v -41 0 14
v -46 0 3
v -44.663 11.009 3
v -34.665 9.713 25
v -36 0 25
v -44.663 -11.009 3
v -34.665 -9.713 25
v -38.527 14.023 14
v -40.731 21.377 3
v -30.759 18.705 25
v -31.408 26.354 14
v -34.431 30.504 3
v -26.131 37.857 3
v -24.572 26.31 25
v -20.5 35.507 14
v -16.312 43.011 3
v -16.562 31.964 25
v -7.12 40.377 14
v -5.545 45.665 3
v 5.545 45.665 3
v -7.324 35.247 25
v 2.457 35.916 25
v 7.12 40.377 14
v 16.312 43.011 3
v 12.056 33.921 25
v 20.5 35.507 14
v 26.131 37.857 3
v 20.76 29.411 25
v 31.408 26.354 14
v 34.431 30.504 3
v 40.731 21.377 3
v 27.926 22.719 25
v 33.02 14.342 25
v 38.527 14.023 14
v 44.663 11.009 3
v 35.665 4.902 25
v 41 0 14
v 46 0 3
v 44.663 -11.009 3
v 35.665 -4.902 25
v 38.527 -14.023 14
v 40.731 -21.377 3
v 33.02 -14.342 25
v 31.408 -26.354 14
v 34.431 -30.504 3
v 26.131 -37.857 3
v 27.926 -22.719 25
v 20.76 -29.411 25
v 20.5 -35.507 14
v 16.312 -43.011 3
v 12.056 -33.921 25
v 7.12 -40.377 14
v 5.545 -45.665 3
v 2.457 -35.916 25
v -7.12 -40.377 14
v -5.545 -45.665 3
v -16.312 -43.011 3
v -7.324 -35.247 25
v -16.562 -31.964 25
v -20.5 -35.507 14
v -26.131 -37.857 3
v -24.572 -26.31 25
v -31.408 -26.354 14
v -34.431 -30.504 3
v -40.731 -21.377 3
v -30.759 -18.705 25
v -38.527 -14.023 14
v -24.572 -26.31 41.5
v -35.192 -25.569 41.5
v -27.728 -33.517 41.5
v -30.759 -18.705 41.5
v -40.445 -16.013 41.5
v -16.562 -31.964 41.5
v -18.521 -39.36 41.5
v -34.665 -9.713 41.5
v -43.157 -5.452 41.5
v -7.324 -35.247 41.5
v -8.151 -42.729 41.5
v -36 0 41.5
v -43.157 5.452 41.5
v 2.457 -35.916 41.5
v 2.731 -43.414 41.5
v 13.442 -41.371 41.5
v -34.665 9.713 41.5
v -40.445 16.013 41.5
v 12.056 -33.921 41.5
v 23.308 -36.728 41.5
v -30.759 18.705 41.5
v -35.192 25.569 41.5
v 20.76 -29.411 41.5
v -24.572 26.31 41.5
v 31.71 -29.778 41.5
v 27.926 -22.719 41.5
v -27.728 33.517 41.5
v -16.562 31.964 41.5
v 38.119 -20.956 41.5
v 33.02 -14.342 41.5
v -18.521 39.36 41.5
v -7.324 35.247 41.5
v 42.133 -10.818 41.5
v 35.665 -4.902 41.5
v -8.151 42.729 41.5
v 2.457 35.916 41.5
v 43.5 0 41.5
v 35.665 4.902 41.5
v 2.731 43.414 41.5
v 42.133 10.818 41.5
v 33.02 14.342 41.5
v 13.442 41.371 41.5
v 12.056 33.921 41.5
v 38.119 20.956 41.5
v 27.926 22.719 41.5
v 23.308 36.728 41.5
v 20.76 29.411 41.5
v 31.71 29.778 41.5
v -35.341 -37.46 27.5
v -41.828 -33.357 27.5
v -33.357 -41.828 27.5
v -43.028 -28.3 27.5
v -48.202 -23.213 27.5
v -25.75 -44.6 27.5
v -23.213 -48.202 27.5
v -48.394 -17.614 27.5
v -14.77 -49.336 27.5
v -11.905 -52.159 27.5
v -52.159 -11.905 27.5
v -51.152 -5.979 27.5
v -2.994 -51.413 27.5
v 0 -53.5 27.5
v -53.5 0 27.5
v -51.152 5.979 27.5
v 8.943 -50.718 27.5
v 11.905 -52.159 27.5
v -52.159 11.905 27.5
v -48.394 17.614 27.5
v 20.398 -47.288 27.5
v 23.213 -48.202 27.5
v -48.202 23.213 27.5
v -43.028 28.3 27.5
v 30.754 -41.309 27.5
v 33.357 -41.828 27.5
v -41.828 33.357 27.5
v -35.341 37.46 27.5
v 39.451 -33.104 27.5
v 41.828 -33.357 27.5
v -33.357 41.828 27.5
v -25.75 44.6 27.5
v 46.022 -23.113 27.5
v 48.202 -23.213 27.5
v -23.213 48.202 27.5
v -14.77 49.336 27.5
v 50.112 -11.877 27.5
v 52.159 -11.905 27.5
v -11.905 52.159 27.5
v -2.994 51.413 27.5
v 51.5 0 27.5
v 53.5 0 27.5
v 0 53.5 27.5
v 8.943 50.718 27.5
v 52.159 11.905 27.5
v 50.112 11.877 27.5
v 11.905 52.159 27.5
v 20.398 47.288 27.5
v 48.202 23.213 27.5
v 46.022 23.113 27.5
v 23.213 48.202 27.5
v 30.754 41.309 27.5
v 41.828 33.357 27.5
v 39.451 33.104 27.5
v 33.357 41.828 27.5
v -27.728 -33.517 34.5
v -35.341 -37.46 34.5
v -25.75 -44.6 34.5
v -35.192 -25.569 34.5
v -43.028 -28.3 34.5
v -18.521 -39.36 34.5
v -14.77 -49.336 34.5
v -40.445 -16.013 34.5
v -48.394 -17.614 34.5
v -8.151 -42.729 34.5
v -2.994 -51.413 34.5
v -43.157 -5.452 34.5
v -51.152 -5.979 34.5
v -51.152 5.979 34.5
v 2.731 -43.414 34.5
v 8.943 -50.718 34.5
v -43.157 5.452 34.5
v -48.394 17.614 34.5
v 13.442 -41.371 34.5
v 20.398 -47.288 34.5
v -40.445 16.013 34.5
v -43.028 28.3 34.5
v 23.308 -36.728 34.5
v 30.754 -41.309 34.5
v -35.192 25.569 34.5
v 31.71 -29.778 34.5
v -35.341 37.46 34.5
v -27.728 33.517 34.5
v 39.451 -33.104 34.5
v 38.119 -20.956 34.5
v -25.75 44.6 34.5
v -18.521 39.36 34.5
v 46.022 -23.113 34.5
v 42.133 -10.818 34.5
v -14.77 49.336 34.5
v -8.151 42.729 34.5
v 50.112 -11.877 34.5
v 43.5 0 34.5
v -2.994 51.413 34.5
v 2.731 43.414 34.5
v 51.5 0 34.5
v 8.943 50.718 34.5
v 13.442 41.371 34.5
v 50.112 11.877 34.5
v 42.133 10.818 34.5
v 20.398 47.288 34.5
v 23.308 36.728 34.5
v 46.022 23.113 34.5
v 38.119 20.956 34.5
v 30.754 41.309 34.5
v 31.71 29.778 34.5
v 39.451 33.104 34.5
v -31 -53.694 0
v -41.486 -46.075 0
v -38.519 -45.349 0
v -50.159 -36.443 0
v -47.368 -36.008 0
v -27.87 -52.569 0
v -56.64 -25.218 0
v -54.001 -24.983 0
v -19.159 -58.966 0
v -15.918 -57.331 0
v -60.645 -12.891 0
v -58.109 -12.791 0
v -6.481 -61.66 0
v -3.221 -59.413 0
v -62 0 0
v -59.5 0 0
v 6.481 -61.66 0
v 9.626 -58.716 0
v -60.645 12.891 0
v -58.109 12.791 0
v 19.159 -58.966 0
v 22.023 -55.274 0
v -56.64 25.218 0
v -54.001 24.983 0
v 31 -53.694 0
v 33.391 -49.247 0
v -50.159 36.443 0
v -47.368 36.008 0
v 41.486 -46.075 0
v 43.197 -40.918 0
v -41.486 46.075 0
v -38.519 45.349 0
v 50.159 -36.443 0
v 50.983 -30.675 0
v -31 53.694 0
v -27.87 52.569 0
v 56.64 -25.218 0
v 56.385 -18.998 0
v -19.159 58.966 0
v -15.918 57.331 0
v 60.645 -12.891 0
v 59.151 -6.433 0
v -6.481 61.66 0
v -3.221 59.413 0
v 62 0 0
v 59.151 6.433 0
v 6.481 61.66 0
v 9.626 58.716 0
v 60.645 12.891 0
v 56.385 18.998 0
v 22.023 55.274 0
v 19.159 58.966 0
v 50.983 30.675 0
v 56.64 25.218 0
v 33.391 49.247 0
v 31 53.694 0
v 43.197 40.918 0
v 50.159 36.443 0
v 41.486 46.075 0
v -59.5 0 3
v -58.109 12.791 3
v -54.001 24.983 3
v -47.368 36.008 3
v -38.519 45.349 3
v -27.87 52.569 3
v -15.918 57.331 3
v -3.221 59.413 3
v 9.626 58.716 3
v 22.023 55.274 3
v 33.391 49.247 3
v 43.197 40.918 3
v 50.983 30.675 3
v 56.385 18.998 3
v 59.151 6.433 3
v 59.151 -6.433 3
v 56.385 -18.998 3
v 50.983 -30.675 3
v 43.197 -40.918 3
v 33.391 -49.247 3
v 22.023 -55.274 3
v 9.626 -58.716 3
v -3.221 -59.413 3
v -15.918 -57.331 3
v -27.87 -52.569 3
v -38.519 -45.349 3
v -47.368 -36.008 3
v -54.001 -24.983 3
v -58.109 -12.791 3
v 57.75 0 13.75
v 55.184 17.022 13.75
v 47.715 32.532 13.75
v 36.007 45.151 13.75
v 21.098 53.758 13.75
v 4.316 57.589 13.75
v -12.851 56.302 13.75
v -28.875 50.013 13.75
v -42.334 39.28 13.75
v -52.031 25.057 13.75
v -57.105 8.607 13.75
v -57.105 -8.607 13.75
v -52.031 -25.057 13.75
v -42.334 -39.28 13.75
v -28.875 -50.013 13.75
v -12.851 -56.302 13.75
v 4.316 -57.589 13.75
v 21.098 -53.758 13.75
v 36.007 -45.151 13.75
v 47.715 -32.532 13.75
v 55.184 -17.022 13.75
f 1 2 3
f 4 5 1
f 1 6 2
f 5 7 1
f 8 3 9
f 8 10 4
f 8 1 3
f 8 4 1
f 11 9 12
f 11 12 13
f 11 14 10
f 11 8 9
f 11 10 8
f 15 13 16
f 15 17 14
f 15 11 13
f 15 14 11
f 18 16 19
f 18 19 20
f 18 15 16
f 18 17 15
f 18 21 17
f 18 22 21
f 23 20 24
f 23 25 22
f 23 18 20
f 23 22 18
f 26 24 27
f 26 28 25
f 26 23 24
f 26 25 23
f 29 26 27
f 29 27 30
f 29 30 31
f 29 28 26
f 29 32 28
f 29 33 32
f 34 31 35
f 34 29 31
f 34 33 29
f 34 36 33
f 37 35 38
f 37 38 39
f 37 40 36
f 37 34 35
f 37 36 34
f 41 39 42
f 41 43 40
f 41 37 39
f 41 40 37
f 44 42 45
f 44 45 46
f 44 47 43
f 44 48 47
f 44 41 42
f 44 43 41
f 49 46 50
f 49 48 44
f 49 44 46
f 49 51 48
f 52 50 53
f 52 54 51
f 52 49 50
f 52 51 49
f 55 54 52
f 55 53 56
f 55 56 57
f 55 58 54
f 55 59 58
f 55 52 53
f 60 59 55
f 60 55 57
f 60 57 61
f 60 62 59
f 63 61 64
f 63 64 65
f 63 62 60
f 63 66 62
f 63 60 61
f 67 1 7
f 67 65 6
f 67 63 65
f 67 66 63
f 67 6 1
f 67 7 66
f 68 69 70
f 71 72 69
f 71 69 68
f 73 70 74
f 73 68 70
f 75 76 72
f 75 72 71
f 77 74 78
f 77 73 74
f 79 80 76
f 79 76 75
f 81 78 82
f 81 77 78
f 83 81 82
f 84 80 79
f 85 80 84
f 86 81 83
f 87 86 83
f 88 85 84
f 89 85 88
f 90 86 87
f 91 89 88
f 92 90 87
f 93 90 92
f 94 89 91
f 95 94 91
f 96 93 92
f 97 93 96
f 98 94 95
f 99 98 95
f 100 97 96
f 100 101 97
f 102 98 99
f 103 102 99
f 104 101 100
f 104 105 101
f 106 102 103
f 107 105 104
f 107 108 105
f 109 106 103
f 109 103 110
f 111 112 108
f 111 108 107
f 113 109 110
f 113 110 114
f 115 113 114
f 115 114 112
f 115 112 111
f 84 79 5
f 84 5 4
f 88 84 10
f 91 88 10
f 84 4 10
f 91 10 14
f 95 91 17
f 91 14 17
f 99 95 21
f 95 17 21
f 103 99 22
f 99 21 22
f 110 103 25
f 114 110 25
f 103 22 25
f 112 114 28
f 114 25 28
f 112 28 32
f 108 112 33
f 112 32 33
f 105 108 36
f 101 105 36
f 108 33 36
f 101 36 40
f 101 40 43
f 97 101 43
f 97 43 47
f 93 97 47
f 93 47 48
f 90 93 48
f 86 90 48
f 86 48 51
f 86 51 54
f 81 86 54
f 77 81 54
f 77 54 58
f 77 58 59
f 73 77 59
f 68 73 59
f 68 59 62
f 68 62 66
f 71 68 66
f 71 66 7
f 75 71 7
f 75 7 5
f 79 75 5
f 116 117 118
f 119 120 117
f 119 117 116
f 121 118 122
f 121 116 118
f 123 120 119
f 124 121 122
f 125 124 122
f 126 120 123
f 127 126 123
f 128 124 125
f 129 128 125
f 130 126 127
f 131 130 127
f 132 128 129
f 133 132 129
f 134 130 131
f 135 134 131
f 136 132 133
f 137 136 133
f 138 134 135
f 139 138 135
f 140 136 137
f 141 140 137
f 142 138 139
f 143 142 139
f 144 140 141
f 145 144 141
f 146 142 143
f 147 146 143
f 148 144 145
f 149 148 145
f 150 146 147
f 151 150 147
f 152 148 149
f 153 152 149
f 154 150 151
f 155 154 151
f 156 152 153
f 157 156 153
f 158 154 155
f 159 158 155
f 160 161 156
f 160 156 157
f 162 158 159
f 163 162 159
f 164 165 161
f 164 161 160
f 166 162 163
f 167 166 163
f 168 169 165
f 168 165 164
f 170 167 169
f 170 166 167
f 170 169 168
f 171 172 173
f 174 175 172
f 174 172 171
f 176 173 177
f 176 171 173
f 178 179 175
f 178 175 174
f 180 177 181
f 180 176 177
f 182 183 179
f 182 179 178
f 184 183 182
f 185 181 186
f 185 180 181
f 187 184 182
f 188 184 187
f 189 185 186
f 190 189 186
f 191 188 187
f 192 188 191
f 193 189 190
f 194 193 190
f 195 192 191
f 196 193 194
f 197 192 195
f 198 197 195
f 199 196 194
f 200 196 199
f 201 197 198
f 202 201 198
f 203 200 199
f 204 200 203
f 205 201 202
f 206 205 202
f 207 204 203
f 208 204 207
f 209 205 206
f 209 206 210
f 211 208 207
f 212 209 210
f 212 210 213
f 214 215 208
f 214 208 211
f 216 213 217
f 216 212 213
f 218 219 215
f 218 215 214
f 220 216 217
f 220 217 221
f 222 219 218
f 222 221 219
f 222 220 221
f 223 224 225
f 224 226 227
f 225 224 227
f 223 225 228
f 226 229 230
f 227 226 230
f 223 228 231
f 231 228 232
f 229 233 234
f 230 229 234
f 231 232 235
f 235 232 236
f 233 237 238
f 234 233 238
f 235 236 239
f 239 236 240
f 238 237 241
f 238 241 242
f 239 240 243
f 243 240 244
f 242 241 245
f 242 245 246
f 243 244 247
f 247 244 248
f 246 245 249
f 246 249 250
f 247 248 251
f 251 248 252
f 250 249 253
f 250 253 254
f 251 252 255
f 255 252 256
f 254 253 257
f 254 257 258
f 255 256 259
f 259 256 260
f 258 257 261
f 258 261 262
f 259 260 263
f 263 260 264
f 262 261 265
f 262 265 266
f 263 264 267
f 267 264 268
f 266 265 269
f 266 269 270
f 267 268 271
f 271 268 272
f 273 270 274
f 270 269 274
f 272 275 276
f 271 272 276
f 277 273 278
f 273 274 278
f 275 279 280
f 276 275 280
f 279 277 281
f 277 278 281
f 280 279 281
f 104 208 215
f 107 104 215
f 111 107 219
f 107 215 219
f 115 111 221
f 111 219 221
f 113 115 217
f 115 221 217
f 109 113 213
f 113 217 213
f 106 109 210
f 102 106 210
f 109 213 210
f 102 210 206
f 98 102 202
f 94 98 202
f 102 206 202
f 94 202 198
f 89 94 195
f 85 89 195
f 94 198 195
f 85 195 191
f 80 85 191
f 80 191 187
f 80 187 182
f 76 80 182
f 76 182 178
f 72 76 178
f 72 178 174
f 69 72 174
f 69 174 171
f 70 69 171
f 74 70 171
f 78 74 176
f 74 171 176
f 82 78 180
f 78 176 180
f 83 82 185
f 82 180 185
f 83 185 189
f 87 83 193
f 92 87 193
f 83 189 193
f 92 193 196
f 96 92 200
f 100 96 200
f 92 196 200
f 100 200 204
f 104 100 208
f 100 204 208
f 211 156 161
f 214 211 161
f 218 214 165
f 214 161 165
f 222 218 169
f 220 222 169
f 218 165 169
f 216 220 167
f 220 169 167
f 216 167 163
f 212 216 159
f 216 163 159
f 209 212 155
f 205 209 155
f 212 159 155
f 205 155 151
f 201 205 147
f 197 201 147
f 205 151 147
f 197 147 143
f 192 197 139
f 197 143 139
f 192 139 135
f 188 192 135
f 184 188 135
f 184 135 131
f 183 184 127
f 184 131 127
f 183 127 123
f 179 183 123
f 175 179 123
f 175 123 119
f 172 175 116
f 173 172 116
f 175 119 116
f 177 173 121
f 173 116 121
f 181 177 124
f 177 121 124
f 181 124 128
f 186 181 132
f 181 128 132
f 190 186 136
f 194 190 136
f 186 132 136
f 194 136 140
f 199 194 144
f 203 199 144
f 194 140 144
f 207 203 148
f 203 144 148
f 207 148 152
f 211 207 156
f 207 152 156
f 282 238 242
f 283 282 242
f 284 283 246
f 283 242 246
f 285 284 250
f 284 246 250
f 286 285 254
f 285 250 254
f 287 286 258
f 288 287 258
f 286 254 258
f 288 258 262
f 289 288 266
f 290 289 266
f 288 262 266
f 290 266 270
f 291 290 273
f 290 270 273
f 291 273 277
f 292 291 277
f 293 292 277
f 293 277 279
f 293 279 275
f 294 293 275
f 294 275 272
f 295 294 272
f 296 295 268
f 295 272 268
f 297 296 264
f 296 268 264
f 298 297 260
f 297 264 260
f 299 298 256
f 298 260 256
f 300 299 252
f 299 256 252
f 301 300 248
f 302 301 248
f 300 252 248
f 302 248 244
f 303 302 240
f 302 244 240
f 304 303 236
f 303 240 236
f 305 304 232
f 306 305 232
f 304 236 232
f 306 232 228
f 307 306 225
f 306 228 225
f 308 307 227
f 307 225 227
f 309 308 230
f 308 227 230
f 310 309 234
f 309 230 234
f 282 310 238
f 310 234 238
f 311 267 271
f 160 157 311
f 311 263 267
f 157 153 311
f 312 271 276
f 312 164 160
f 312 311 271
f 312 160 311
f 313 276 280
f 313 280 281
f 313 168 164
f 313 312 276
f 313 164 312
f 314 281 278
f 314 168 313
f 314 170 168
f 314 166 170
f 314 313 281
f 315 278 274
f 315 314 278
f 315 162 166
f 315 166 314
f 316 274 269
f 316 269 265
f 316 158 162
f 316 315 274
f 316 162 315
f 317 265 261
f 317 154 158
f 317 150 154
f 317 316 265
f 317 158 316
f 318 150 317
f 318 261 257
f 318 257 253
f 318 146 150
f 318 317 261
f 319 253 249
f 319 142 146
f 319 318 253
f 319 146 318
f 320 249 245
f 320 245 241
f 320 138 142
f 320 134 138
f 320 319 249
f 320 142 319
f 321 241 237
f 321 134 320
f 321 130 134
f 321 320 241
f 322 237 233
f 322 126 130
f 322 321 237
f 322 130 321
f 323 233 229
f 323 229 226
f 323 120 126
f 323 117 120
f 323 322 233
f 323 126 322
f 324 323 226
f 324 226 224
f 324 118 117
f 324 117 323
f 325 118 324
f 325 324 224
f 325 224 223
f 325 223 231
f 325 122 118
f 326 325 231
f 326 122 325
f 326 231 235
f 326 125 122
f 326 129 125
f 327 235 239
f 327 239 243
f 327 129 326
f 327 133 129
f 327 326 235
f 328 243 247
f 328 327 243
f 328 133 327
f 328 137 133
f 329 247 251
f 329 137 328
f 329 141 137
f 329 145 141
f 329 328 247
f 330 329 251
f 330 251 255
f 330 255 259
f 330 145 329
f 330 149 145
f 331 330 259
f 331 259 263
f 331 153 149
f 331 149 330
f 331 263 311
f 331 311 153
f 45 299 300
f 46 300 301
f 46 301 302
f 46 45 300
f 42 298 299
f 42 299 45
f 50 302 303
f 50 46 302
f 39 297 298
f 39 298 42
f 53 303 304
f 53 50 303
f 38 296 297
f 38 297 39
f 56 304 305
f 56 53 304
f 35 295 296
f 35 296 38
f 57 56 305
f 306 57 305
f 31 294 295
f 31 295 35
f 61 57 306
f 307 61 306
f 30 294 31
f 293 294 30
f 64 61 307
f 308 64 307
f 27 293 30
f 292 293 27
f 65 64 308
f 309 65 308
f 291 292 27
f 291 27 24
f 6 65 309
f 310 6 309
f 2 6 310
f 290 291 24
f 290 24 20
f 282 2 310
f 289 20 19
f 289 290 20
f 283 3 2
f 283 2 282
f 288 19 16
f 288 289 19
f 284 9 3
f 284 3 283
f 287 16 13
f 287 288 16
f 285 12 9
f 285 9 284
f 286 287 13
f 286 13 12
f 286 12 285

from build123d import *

# Parameters (mm, degrees)
SKETCH1_R           = 62
SKETCH2_R           = 53.5
SKETCH3_R           = 51.5
BOSS_EXTRUDE1_DEPTH = 7
SKETCH4_R           = 43.5
BOSS_EXTRUDE2_DEPTH = 7
SKETCH5_R           = 59.5
CUT_EXTRUDE1_DEPTH  = 3
SKETCH6_R           = 46
SKETCH7_R           = 36
SKETCH8_R           = 36
CUT_EXTRUDE2_DEPTH  = 92.175654809


with BuildPart() as part:
    # Sketch1 → Loft1 section 0
    with BuildSketch(Plane.XY):
        Circle(SKETCH1_R)
    # Sketch2 → Loft1 section 1
    with BuildSketch(Plane.XY.offset(27.5)):
        Circle(SKETCH2_R)
    loft()

    # Sketch3 → Boss-Extrude1 (add)
    with BuildSketch(Plane.XY.offset(27.5)):
        Circle(SKETCH3_R)
    extrude(amount=BOSS_EXTRUDE1_DEPTH)

    # Sketch4 → Boss-Extrude2 (add)
    with BuildSketch(Plane.XY.offset(34.5)):
        Circle(SKETCH4_R)
    extrude(amount=BOSS_EXTRUDE2_DEPTH)

    # Sketch5 → Cut-Extrude1 (cut)
    with BuildSketch(Plane(origin=(0, 0, 0), x_dir=(-1, 0, 0), z_dir=(0, 0, -1))):
        Circle(SKETCH5_R)
    extrude(amount=-CUT_EXTRUDE1_DEPTH, mode=Mode.SUBTRACT)

    # Sketch6 → Cut-Loft1 section 0
    with BuildSketch(Plane(origin=(0, 0, 3), x_dir=(-1, 0, 0), z_dir=(0, 0, -1))):
        Circle(SKETCH6_R)
    # Sketch7 → Cut-Loft1 section 1
    with BuildSketch(Plane(origin=(0, 0, 25), x_dir=(-1, 0, 0), z_dir=(0, 0, -1))):
        Circle(SKETCH7_R)
    loft(mode=Mode.SUBTRACT)

    # Sketch8 → Cut-Extrude2 (cut, through all)
    with BuildSketch(Plane(origin=(0, 0, 25), x_dir=(-1, 0, 0), z_dir=(0, 0, -1))):
        Circle(SKETCH8_R)
    extrude(amount=-CUT_EXTRUDE2_DEPTH, mode=Mode.SUBTRACT)


solid = part.part
